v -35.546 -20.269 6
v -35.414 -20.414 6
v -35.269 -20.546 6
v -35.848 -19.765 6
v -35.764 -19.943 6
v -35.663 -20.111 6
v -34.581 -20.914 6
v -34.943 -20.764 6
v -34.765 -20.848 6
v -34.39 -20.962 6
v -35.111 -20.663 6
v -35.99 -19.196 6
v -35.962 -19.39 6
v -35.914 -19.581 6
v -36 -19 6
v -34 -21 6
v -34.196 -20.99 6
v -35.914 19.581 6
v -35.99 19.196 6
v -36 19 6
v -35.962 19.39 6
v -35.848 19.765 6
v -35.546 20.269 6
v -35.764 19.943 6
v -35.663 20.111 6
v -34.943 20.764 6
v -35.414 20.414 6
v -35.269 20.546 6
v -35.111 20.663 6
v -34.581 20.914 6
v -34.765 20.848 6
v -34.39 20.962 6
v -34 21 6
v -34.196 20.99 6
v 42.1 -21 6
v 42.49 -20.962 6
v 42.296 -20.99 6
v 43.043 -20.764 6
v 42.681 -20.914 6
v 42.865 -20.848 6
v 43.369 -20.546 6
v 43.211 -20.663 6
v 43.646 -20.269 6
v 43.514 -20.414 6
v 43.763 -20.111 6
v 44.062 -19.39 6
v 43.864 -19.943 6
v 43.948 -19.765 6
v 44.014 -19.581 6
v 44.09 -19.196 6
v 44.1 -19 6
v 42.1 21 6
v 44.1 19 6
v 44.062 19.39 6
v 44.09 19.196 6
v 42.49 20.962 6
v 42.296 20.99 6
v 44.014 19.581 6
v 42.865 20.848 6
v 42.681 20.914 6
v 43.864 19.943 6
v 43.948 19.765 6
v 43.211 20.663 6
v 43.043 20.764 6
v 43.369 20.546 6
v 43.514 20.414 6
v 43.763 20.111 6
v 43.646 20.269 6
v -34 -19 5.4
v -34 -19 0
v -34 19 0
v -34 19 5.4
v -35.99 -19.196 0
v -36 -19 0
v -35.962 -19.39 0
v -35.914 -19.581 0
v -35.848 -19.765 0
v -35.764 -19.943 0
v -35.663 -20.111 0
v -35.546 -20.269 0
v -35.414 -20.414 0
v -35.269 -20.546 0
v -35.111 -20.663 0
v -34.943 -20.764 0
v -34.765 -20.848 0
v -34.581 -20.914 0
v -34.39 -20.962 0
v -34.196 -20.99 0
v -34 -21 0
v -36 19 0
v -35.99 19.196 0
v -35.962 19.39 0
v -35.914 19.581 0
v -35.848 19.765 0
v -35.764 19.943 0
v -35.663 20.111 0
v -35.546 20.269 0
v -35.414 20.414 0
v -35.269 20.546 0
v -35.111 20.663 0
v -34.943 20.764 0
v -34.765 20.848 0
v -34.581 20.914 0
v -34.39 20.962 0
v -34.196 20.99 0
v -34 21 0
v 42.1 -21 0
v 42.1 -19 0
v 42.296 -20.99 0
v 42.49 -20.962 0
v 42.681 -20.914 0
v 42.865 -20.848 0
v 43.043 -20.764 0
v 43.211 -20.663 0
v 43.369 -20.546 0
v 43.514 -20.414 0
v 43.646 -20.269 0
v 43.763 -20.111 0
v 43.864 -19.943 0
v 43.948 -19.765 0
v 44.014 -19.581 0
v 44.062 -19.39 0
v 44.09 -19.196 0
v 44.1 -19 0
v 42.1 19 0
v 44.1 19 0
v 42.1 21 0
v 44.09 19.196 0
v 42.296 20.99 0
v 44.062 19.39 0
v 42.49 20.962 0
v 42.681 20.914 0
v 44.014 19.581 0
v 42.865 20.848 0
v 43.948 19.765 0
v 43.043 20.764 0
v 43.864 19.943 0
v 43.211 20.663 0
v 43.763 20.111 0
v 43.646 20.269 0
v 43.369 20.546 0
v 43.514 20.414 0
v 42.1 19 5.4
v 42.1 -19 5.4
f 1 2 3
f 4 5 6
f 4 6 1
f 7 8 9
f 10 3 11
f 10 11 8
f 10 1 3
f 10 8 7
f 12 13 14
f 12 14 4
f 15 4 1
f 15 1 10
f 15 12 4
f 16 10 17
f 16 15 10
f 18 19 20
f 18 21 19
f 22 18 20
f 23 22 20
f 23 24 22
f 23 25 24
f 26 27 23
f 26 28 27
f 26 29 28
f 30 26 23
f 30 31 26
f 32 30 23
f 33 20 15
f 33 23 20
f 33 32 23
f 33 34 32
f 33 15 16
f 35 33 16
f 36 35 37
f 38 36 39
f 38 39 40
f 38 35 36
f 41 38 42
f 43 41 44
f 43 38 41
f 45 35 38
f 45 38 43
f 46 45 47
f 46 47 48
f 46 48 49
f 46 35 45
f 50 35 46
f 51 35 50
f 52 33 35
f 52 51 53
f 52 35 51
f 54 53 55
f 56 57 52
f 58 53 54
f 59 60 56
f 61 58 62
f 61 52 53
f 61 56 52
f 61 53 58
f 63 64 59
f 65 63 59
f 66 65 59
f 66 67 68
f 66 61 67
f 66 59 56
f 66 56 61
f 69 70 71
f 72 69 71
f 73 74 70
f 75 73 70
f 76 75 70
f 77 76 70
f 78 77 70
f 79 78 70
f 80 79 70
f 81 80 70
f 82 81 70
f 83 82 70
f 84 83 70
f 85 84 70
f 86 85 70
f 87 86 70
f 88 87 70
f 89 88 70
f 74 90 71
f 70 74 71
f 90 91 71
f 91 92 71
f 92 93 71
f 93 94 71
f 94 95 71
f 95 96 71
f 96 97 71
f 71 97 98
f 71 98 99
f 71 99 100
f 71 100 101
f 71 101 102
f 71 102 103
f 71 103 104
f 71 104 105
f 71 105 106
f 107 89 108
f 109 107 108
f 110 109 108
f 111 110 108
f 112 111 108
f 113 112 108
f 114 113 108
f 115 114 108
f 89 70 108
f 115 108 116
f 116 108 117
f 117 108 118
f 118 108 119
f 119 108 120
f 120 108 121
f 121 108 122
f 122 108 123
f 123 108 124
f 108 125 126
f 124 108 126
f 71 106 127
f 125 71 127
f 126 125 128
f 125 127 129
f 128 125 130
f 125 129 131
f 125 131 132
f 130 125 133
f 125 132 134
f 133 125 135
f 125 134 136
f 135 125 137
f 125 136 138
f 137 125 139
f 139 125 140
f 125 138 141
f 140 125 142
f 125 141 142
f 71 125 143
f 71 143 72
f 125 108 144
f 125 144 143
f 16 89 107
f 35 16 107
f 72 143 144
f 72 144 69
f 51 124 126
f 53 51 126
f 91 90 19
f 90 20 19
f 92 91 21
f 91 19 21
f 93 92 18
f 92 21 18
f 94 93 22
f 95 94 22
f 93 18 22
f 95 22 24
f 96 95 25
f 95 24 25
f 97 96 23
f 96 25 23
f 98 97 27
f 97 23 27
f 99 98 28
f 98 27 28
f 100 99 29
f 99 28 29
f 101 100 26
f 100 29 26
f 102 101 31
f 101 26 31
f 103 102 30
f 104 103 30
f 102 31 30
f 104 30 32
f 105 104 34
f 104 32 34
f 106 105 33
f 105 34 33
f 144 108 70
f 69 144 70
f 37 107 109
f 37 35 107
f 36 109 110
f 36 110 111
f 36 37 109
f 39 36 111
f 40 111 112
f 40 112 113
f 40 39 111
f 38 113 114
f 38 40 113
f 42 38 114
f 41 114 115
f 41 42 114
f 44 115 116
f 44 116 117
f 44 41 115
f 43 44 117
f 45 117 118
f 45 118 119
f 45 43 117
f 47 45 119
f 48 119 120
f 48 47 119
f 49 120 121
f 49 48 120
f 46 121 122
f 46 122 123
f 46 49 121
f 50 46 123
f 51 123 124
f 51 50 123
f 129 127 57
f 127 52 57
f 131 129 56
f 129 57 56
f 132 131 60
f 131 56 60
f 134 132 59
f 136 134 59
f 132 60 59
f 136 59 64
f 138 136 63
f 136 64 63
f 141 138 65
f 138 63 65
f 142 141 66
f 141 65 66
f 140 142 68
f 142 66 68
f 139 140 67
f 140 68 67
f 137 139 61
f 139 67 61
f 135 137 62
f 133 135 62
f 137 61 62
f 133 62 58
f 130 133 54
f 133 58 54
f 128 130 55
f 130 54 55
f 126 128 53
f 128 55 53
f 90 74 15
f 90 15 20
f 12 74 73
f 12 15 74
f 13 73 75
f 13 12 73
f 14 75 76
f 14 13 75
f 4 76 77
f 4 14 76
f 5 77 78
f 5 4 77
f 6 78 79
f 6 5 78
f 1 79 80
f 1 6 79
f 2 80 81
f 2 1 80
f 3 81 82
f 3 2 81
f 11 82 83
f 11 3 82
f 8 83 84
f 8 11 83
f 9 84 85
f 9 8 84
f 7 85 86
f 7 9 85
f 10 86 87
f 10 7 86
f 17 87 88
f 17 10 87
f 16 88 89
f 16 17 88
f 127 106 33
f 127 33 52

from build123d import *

# Parameters (mm, degrees)
SKETCH1_W           = 80.1
SKETCH1_H           = 42
BOSS_EXTRUDE1_DEPTH = 6
SKETCH2_W           = 76.1
SKETCH2_H           = 38
CUT_EXTRUDE1_DEPTH  = 5.4
FILLET1_R           = 2


with BuildPart() as part:
    # Sketch1 → Boss-Extrude1 (new body)
    with BuildSketch(Plane.XY):
        with Locations((4.05, 0)):
            Rectangle(SKETCH1_W, SKETCH1_H)
    extrude(amount=BOSS_EXTRUDE1_DEPTH)

    # Sketch2 → Cut-Extrude1 (cut)
    with BuildSketch(Plane(origin=(0, 0, 0), x_dir=(-1, 0, 0), z_dir=(0, 0, -1))):
        with Locations((-4.05, 0)):
            Rectangle(SKETCH2_W, SKETCH2_H)
    extrude(amount=-CUT_EXTRUDE1_DEPTH, mode=Mode.SUBTRACT)

    # Fillet1
    fillet1_edges = [part.edges().sort_by_distance(p)[0] for p in [
        (-36, 21, 3),
        (44.1, 21, 3),
        (44.1, -21, 3),
        (-36, -21, 3),
    ]]
    fillet(fillet1_edges, radius=FILLET1_R)


solid = part.part
